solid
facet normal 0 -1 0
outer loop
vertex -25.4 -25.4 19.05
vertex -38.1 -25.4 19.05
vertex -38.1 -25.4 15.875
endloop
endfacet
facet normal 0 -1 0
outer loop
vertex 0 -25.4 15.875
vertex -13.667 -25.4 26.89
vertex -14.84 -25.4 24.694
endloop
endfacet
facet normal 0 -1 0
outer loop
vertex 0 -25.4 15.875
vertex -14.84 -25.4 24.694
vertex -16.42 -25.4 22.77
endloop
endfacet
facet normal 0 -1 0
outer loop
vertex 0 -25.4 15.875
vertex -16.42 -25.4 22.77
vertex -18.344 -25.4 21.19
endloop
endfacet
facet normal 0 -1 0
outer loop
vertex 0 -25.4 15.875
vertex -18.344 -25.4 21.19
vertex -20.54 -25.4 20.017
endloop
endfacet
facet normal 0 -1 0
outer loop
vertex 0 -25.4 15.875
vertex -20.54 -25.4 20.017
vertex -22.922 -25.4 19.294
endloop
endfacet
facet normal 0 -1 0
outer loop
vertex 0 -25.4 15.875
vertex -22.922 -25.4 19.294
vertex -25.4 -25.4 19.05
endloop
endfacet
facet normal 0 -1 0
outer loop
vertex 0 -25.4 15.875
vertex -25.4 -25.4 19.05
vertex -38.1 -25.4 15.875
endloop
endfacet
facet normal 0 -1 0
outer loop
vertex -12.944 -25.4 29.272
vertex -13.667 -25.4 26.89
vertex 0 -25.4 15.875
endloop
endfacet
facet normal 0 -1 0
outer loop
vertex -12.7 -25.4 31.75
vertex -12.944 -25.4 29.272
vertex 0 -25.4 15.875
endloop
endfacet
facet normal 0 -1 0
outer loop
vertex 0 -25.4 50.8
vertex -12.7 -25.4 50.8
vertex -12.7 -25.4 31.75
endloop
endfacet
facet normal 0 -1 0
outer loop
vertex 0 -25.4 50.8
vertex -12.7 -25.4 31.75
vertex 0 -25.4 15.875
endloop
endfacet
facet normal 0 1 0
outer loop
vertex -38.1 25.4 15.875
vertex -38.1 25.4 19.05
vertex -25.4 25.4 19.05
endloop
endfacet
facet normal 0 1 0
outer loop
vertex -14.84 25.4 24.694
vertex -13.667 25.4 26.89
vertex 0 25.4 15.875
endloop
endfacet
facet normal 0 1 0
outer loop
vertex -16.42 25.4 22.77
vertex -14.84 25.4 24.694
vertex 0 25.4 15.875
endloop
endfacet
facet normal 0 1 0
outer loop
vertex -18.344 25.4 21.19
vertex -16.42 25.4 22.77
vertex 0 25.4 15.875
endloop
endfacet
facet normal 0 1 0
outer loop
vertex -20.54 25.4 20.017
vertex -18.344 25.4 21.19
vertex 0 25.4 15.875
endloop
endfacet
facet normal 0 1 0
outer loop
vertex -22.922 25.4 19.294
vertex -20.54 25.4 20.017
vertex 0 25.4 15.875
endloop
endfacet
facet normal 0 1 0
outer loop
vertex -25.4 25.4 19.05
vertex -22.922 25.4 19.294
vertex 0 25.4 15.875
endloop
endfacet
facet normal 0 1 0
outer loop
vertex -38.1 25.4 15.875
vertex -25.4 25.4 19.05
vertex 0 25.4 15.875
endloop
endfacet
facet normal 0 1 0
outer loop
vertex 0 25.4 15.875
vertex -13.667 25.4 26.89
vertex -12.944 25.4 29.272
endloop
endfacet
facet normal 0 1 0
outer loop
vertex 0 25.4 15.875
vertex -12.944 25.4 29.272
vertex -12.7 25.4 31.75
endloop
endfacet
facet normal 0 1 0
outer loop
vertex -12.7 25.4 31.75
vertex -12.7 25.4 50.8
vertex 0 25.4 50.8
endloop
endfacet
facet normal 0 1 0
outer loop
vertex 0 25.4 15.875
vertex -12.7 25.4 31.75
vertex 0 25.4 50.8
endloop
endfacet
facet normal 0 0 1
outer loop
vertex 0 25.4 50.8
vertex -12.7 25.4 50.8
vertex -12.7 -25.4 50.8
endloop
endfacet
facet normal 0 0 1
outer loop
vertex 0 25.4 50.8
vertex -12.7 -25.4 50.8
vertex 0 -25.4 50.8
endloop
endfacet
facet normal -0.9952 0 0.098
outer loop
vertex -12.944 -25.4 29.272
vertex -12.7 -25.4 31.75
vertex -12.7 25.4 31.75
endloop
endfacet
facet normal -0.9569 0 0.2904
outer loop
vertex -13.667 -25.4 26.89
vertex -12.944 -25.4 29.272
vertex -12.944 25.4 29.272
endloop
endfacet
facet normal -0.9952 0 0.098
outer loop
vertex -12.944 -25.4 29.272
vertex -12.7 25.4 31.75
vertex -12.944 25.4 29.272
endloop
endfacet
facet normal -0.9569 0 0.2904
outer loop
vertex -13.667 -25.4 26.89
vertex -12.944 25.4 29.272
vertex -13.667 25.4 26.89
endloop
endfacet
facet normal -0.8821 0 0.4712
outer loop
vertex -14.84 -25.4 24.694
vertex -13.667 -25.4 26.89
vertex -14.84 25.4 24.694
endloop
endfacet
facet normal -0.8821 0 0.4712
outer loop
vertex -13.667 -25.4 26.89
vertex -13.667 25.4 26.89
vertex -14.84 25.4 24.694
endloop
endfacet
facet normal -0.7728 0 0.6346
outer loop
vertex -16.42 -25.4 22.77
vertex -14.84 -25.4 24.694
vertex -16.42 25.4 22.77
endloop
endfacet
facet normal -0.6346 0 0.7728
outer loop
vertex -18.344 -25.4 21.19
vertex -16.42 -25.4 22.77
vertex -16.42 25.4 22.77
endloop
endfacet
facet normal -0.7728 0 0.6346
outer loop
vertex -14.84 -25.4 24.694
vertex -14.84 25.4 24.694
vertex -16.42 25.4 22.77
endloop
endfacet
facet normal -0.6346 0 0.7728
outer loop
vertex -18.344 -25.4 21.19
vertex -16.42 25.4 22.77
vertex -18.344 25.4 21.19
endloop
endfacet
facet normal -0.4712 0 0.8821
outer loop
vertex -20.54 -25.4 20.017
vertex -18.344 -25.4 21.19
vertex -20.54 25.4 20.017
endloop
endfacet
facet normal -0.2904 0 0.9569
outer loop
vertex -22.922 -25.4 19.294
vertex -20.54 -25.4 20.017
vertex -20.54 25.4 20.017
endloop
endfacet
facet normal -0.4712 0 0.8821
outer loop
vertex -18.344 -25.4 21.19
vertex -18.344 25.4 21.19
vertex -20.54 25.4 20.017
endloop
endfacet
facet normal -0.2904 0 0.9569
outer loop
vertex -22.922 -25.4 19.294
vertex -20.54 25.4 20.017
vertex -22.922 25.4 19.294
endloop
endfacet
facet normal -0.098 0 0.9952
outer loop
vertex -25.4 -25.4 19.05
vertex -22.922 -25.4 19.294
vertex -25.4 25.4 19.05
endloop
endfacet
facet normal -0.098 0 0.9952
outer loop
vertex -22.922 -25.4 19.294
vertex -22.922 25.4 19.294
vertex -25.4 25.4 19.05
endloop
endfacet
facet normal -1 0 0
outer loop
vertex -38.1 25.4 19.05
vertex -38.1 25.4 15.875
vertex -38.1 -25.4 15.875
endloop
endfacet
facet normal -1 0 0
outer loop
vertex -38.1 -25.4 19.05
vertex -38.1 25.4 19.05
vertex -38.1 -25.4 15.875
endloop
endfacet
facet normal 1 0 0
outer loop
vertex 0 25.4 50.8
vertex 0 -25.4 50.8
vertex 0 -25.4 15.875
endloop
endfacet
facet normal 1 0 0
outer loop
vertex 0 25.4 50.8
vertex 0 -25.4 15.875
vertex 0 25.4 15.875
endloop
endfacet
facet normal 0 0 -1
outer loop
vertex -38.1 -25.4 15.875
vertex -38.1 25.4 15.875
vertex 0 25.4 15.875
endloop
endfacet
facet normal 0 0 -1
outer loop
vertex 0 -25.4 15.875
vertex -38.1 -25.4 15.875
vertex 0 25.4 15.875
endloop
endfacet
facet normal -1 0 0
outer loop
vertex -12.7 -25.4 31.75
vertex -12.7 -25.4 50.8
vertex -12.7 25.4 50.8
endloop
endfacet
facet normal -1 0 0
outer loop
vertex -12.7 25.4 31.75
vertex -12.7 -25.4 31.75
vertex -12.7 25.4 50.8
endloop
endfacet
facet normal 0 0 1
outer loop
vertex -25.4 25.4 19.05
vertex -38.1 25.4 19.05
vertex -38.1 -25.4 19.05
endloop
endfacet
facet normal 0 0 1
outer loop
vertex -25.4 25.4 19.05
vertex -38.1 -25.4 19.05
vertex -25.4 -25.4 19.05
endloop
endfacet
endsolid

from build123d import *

# Parameters (mm, degrees)
BOSS_EXTRUDE1_DEPTH = 3.175
SKETCH2_W           = 12.7
SKETCH2_H           = 50.8
BOSS_EXTRUDE2_DEPTH = 31.75
FILLET1_R           = 12.7


with BuildPart() as part:
    # Sketch1 → Boss-Extrude1 (new body)
    with BuildSketch(Plane.XY.offset(15.875)):
        Polygon((-38.1, 25.4), (-38.1, -25.4), (-25.4, -25.4), (0, -25.4), (0, 25.4), align=None)
    extrude(amount=BOSS_EXTRUDE1_DEPTH)

    # Sketch2 → Boss-Extrude2 (add)
    with BuildSketch(Plane.XY.offset(50.8)):
        with Locations((-6.35, 0)):
            Rectangle(SKETCH2_W, SKETCH2_H)
    extrude(amount=-BOSS_EXTRUDE2_DEPTH)

    # Fillet1
    fillet1_edges = [part.edges().sort_by_distance(p)[0] for p in [
        (-12.7, 0, 19.05),
    ]]
    fillet(fillet1_edges, radius=FILLET1_R)


solid = part.part
